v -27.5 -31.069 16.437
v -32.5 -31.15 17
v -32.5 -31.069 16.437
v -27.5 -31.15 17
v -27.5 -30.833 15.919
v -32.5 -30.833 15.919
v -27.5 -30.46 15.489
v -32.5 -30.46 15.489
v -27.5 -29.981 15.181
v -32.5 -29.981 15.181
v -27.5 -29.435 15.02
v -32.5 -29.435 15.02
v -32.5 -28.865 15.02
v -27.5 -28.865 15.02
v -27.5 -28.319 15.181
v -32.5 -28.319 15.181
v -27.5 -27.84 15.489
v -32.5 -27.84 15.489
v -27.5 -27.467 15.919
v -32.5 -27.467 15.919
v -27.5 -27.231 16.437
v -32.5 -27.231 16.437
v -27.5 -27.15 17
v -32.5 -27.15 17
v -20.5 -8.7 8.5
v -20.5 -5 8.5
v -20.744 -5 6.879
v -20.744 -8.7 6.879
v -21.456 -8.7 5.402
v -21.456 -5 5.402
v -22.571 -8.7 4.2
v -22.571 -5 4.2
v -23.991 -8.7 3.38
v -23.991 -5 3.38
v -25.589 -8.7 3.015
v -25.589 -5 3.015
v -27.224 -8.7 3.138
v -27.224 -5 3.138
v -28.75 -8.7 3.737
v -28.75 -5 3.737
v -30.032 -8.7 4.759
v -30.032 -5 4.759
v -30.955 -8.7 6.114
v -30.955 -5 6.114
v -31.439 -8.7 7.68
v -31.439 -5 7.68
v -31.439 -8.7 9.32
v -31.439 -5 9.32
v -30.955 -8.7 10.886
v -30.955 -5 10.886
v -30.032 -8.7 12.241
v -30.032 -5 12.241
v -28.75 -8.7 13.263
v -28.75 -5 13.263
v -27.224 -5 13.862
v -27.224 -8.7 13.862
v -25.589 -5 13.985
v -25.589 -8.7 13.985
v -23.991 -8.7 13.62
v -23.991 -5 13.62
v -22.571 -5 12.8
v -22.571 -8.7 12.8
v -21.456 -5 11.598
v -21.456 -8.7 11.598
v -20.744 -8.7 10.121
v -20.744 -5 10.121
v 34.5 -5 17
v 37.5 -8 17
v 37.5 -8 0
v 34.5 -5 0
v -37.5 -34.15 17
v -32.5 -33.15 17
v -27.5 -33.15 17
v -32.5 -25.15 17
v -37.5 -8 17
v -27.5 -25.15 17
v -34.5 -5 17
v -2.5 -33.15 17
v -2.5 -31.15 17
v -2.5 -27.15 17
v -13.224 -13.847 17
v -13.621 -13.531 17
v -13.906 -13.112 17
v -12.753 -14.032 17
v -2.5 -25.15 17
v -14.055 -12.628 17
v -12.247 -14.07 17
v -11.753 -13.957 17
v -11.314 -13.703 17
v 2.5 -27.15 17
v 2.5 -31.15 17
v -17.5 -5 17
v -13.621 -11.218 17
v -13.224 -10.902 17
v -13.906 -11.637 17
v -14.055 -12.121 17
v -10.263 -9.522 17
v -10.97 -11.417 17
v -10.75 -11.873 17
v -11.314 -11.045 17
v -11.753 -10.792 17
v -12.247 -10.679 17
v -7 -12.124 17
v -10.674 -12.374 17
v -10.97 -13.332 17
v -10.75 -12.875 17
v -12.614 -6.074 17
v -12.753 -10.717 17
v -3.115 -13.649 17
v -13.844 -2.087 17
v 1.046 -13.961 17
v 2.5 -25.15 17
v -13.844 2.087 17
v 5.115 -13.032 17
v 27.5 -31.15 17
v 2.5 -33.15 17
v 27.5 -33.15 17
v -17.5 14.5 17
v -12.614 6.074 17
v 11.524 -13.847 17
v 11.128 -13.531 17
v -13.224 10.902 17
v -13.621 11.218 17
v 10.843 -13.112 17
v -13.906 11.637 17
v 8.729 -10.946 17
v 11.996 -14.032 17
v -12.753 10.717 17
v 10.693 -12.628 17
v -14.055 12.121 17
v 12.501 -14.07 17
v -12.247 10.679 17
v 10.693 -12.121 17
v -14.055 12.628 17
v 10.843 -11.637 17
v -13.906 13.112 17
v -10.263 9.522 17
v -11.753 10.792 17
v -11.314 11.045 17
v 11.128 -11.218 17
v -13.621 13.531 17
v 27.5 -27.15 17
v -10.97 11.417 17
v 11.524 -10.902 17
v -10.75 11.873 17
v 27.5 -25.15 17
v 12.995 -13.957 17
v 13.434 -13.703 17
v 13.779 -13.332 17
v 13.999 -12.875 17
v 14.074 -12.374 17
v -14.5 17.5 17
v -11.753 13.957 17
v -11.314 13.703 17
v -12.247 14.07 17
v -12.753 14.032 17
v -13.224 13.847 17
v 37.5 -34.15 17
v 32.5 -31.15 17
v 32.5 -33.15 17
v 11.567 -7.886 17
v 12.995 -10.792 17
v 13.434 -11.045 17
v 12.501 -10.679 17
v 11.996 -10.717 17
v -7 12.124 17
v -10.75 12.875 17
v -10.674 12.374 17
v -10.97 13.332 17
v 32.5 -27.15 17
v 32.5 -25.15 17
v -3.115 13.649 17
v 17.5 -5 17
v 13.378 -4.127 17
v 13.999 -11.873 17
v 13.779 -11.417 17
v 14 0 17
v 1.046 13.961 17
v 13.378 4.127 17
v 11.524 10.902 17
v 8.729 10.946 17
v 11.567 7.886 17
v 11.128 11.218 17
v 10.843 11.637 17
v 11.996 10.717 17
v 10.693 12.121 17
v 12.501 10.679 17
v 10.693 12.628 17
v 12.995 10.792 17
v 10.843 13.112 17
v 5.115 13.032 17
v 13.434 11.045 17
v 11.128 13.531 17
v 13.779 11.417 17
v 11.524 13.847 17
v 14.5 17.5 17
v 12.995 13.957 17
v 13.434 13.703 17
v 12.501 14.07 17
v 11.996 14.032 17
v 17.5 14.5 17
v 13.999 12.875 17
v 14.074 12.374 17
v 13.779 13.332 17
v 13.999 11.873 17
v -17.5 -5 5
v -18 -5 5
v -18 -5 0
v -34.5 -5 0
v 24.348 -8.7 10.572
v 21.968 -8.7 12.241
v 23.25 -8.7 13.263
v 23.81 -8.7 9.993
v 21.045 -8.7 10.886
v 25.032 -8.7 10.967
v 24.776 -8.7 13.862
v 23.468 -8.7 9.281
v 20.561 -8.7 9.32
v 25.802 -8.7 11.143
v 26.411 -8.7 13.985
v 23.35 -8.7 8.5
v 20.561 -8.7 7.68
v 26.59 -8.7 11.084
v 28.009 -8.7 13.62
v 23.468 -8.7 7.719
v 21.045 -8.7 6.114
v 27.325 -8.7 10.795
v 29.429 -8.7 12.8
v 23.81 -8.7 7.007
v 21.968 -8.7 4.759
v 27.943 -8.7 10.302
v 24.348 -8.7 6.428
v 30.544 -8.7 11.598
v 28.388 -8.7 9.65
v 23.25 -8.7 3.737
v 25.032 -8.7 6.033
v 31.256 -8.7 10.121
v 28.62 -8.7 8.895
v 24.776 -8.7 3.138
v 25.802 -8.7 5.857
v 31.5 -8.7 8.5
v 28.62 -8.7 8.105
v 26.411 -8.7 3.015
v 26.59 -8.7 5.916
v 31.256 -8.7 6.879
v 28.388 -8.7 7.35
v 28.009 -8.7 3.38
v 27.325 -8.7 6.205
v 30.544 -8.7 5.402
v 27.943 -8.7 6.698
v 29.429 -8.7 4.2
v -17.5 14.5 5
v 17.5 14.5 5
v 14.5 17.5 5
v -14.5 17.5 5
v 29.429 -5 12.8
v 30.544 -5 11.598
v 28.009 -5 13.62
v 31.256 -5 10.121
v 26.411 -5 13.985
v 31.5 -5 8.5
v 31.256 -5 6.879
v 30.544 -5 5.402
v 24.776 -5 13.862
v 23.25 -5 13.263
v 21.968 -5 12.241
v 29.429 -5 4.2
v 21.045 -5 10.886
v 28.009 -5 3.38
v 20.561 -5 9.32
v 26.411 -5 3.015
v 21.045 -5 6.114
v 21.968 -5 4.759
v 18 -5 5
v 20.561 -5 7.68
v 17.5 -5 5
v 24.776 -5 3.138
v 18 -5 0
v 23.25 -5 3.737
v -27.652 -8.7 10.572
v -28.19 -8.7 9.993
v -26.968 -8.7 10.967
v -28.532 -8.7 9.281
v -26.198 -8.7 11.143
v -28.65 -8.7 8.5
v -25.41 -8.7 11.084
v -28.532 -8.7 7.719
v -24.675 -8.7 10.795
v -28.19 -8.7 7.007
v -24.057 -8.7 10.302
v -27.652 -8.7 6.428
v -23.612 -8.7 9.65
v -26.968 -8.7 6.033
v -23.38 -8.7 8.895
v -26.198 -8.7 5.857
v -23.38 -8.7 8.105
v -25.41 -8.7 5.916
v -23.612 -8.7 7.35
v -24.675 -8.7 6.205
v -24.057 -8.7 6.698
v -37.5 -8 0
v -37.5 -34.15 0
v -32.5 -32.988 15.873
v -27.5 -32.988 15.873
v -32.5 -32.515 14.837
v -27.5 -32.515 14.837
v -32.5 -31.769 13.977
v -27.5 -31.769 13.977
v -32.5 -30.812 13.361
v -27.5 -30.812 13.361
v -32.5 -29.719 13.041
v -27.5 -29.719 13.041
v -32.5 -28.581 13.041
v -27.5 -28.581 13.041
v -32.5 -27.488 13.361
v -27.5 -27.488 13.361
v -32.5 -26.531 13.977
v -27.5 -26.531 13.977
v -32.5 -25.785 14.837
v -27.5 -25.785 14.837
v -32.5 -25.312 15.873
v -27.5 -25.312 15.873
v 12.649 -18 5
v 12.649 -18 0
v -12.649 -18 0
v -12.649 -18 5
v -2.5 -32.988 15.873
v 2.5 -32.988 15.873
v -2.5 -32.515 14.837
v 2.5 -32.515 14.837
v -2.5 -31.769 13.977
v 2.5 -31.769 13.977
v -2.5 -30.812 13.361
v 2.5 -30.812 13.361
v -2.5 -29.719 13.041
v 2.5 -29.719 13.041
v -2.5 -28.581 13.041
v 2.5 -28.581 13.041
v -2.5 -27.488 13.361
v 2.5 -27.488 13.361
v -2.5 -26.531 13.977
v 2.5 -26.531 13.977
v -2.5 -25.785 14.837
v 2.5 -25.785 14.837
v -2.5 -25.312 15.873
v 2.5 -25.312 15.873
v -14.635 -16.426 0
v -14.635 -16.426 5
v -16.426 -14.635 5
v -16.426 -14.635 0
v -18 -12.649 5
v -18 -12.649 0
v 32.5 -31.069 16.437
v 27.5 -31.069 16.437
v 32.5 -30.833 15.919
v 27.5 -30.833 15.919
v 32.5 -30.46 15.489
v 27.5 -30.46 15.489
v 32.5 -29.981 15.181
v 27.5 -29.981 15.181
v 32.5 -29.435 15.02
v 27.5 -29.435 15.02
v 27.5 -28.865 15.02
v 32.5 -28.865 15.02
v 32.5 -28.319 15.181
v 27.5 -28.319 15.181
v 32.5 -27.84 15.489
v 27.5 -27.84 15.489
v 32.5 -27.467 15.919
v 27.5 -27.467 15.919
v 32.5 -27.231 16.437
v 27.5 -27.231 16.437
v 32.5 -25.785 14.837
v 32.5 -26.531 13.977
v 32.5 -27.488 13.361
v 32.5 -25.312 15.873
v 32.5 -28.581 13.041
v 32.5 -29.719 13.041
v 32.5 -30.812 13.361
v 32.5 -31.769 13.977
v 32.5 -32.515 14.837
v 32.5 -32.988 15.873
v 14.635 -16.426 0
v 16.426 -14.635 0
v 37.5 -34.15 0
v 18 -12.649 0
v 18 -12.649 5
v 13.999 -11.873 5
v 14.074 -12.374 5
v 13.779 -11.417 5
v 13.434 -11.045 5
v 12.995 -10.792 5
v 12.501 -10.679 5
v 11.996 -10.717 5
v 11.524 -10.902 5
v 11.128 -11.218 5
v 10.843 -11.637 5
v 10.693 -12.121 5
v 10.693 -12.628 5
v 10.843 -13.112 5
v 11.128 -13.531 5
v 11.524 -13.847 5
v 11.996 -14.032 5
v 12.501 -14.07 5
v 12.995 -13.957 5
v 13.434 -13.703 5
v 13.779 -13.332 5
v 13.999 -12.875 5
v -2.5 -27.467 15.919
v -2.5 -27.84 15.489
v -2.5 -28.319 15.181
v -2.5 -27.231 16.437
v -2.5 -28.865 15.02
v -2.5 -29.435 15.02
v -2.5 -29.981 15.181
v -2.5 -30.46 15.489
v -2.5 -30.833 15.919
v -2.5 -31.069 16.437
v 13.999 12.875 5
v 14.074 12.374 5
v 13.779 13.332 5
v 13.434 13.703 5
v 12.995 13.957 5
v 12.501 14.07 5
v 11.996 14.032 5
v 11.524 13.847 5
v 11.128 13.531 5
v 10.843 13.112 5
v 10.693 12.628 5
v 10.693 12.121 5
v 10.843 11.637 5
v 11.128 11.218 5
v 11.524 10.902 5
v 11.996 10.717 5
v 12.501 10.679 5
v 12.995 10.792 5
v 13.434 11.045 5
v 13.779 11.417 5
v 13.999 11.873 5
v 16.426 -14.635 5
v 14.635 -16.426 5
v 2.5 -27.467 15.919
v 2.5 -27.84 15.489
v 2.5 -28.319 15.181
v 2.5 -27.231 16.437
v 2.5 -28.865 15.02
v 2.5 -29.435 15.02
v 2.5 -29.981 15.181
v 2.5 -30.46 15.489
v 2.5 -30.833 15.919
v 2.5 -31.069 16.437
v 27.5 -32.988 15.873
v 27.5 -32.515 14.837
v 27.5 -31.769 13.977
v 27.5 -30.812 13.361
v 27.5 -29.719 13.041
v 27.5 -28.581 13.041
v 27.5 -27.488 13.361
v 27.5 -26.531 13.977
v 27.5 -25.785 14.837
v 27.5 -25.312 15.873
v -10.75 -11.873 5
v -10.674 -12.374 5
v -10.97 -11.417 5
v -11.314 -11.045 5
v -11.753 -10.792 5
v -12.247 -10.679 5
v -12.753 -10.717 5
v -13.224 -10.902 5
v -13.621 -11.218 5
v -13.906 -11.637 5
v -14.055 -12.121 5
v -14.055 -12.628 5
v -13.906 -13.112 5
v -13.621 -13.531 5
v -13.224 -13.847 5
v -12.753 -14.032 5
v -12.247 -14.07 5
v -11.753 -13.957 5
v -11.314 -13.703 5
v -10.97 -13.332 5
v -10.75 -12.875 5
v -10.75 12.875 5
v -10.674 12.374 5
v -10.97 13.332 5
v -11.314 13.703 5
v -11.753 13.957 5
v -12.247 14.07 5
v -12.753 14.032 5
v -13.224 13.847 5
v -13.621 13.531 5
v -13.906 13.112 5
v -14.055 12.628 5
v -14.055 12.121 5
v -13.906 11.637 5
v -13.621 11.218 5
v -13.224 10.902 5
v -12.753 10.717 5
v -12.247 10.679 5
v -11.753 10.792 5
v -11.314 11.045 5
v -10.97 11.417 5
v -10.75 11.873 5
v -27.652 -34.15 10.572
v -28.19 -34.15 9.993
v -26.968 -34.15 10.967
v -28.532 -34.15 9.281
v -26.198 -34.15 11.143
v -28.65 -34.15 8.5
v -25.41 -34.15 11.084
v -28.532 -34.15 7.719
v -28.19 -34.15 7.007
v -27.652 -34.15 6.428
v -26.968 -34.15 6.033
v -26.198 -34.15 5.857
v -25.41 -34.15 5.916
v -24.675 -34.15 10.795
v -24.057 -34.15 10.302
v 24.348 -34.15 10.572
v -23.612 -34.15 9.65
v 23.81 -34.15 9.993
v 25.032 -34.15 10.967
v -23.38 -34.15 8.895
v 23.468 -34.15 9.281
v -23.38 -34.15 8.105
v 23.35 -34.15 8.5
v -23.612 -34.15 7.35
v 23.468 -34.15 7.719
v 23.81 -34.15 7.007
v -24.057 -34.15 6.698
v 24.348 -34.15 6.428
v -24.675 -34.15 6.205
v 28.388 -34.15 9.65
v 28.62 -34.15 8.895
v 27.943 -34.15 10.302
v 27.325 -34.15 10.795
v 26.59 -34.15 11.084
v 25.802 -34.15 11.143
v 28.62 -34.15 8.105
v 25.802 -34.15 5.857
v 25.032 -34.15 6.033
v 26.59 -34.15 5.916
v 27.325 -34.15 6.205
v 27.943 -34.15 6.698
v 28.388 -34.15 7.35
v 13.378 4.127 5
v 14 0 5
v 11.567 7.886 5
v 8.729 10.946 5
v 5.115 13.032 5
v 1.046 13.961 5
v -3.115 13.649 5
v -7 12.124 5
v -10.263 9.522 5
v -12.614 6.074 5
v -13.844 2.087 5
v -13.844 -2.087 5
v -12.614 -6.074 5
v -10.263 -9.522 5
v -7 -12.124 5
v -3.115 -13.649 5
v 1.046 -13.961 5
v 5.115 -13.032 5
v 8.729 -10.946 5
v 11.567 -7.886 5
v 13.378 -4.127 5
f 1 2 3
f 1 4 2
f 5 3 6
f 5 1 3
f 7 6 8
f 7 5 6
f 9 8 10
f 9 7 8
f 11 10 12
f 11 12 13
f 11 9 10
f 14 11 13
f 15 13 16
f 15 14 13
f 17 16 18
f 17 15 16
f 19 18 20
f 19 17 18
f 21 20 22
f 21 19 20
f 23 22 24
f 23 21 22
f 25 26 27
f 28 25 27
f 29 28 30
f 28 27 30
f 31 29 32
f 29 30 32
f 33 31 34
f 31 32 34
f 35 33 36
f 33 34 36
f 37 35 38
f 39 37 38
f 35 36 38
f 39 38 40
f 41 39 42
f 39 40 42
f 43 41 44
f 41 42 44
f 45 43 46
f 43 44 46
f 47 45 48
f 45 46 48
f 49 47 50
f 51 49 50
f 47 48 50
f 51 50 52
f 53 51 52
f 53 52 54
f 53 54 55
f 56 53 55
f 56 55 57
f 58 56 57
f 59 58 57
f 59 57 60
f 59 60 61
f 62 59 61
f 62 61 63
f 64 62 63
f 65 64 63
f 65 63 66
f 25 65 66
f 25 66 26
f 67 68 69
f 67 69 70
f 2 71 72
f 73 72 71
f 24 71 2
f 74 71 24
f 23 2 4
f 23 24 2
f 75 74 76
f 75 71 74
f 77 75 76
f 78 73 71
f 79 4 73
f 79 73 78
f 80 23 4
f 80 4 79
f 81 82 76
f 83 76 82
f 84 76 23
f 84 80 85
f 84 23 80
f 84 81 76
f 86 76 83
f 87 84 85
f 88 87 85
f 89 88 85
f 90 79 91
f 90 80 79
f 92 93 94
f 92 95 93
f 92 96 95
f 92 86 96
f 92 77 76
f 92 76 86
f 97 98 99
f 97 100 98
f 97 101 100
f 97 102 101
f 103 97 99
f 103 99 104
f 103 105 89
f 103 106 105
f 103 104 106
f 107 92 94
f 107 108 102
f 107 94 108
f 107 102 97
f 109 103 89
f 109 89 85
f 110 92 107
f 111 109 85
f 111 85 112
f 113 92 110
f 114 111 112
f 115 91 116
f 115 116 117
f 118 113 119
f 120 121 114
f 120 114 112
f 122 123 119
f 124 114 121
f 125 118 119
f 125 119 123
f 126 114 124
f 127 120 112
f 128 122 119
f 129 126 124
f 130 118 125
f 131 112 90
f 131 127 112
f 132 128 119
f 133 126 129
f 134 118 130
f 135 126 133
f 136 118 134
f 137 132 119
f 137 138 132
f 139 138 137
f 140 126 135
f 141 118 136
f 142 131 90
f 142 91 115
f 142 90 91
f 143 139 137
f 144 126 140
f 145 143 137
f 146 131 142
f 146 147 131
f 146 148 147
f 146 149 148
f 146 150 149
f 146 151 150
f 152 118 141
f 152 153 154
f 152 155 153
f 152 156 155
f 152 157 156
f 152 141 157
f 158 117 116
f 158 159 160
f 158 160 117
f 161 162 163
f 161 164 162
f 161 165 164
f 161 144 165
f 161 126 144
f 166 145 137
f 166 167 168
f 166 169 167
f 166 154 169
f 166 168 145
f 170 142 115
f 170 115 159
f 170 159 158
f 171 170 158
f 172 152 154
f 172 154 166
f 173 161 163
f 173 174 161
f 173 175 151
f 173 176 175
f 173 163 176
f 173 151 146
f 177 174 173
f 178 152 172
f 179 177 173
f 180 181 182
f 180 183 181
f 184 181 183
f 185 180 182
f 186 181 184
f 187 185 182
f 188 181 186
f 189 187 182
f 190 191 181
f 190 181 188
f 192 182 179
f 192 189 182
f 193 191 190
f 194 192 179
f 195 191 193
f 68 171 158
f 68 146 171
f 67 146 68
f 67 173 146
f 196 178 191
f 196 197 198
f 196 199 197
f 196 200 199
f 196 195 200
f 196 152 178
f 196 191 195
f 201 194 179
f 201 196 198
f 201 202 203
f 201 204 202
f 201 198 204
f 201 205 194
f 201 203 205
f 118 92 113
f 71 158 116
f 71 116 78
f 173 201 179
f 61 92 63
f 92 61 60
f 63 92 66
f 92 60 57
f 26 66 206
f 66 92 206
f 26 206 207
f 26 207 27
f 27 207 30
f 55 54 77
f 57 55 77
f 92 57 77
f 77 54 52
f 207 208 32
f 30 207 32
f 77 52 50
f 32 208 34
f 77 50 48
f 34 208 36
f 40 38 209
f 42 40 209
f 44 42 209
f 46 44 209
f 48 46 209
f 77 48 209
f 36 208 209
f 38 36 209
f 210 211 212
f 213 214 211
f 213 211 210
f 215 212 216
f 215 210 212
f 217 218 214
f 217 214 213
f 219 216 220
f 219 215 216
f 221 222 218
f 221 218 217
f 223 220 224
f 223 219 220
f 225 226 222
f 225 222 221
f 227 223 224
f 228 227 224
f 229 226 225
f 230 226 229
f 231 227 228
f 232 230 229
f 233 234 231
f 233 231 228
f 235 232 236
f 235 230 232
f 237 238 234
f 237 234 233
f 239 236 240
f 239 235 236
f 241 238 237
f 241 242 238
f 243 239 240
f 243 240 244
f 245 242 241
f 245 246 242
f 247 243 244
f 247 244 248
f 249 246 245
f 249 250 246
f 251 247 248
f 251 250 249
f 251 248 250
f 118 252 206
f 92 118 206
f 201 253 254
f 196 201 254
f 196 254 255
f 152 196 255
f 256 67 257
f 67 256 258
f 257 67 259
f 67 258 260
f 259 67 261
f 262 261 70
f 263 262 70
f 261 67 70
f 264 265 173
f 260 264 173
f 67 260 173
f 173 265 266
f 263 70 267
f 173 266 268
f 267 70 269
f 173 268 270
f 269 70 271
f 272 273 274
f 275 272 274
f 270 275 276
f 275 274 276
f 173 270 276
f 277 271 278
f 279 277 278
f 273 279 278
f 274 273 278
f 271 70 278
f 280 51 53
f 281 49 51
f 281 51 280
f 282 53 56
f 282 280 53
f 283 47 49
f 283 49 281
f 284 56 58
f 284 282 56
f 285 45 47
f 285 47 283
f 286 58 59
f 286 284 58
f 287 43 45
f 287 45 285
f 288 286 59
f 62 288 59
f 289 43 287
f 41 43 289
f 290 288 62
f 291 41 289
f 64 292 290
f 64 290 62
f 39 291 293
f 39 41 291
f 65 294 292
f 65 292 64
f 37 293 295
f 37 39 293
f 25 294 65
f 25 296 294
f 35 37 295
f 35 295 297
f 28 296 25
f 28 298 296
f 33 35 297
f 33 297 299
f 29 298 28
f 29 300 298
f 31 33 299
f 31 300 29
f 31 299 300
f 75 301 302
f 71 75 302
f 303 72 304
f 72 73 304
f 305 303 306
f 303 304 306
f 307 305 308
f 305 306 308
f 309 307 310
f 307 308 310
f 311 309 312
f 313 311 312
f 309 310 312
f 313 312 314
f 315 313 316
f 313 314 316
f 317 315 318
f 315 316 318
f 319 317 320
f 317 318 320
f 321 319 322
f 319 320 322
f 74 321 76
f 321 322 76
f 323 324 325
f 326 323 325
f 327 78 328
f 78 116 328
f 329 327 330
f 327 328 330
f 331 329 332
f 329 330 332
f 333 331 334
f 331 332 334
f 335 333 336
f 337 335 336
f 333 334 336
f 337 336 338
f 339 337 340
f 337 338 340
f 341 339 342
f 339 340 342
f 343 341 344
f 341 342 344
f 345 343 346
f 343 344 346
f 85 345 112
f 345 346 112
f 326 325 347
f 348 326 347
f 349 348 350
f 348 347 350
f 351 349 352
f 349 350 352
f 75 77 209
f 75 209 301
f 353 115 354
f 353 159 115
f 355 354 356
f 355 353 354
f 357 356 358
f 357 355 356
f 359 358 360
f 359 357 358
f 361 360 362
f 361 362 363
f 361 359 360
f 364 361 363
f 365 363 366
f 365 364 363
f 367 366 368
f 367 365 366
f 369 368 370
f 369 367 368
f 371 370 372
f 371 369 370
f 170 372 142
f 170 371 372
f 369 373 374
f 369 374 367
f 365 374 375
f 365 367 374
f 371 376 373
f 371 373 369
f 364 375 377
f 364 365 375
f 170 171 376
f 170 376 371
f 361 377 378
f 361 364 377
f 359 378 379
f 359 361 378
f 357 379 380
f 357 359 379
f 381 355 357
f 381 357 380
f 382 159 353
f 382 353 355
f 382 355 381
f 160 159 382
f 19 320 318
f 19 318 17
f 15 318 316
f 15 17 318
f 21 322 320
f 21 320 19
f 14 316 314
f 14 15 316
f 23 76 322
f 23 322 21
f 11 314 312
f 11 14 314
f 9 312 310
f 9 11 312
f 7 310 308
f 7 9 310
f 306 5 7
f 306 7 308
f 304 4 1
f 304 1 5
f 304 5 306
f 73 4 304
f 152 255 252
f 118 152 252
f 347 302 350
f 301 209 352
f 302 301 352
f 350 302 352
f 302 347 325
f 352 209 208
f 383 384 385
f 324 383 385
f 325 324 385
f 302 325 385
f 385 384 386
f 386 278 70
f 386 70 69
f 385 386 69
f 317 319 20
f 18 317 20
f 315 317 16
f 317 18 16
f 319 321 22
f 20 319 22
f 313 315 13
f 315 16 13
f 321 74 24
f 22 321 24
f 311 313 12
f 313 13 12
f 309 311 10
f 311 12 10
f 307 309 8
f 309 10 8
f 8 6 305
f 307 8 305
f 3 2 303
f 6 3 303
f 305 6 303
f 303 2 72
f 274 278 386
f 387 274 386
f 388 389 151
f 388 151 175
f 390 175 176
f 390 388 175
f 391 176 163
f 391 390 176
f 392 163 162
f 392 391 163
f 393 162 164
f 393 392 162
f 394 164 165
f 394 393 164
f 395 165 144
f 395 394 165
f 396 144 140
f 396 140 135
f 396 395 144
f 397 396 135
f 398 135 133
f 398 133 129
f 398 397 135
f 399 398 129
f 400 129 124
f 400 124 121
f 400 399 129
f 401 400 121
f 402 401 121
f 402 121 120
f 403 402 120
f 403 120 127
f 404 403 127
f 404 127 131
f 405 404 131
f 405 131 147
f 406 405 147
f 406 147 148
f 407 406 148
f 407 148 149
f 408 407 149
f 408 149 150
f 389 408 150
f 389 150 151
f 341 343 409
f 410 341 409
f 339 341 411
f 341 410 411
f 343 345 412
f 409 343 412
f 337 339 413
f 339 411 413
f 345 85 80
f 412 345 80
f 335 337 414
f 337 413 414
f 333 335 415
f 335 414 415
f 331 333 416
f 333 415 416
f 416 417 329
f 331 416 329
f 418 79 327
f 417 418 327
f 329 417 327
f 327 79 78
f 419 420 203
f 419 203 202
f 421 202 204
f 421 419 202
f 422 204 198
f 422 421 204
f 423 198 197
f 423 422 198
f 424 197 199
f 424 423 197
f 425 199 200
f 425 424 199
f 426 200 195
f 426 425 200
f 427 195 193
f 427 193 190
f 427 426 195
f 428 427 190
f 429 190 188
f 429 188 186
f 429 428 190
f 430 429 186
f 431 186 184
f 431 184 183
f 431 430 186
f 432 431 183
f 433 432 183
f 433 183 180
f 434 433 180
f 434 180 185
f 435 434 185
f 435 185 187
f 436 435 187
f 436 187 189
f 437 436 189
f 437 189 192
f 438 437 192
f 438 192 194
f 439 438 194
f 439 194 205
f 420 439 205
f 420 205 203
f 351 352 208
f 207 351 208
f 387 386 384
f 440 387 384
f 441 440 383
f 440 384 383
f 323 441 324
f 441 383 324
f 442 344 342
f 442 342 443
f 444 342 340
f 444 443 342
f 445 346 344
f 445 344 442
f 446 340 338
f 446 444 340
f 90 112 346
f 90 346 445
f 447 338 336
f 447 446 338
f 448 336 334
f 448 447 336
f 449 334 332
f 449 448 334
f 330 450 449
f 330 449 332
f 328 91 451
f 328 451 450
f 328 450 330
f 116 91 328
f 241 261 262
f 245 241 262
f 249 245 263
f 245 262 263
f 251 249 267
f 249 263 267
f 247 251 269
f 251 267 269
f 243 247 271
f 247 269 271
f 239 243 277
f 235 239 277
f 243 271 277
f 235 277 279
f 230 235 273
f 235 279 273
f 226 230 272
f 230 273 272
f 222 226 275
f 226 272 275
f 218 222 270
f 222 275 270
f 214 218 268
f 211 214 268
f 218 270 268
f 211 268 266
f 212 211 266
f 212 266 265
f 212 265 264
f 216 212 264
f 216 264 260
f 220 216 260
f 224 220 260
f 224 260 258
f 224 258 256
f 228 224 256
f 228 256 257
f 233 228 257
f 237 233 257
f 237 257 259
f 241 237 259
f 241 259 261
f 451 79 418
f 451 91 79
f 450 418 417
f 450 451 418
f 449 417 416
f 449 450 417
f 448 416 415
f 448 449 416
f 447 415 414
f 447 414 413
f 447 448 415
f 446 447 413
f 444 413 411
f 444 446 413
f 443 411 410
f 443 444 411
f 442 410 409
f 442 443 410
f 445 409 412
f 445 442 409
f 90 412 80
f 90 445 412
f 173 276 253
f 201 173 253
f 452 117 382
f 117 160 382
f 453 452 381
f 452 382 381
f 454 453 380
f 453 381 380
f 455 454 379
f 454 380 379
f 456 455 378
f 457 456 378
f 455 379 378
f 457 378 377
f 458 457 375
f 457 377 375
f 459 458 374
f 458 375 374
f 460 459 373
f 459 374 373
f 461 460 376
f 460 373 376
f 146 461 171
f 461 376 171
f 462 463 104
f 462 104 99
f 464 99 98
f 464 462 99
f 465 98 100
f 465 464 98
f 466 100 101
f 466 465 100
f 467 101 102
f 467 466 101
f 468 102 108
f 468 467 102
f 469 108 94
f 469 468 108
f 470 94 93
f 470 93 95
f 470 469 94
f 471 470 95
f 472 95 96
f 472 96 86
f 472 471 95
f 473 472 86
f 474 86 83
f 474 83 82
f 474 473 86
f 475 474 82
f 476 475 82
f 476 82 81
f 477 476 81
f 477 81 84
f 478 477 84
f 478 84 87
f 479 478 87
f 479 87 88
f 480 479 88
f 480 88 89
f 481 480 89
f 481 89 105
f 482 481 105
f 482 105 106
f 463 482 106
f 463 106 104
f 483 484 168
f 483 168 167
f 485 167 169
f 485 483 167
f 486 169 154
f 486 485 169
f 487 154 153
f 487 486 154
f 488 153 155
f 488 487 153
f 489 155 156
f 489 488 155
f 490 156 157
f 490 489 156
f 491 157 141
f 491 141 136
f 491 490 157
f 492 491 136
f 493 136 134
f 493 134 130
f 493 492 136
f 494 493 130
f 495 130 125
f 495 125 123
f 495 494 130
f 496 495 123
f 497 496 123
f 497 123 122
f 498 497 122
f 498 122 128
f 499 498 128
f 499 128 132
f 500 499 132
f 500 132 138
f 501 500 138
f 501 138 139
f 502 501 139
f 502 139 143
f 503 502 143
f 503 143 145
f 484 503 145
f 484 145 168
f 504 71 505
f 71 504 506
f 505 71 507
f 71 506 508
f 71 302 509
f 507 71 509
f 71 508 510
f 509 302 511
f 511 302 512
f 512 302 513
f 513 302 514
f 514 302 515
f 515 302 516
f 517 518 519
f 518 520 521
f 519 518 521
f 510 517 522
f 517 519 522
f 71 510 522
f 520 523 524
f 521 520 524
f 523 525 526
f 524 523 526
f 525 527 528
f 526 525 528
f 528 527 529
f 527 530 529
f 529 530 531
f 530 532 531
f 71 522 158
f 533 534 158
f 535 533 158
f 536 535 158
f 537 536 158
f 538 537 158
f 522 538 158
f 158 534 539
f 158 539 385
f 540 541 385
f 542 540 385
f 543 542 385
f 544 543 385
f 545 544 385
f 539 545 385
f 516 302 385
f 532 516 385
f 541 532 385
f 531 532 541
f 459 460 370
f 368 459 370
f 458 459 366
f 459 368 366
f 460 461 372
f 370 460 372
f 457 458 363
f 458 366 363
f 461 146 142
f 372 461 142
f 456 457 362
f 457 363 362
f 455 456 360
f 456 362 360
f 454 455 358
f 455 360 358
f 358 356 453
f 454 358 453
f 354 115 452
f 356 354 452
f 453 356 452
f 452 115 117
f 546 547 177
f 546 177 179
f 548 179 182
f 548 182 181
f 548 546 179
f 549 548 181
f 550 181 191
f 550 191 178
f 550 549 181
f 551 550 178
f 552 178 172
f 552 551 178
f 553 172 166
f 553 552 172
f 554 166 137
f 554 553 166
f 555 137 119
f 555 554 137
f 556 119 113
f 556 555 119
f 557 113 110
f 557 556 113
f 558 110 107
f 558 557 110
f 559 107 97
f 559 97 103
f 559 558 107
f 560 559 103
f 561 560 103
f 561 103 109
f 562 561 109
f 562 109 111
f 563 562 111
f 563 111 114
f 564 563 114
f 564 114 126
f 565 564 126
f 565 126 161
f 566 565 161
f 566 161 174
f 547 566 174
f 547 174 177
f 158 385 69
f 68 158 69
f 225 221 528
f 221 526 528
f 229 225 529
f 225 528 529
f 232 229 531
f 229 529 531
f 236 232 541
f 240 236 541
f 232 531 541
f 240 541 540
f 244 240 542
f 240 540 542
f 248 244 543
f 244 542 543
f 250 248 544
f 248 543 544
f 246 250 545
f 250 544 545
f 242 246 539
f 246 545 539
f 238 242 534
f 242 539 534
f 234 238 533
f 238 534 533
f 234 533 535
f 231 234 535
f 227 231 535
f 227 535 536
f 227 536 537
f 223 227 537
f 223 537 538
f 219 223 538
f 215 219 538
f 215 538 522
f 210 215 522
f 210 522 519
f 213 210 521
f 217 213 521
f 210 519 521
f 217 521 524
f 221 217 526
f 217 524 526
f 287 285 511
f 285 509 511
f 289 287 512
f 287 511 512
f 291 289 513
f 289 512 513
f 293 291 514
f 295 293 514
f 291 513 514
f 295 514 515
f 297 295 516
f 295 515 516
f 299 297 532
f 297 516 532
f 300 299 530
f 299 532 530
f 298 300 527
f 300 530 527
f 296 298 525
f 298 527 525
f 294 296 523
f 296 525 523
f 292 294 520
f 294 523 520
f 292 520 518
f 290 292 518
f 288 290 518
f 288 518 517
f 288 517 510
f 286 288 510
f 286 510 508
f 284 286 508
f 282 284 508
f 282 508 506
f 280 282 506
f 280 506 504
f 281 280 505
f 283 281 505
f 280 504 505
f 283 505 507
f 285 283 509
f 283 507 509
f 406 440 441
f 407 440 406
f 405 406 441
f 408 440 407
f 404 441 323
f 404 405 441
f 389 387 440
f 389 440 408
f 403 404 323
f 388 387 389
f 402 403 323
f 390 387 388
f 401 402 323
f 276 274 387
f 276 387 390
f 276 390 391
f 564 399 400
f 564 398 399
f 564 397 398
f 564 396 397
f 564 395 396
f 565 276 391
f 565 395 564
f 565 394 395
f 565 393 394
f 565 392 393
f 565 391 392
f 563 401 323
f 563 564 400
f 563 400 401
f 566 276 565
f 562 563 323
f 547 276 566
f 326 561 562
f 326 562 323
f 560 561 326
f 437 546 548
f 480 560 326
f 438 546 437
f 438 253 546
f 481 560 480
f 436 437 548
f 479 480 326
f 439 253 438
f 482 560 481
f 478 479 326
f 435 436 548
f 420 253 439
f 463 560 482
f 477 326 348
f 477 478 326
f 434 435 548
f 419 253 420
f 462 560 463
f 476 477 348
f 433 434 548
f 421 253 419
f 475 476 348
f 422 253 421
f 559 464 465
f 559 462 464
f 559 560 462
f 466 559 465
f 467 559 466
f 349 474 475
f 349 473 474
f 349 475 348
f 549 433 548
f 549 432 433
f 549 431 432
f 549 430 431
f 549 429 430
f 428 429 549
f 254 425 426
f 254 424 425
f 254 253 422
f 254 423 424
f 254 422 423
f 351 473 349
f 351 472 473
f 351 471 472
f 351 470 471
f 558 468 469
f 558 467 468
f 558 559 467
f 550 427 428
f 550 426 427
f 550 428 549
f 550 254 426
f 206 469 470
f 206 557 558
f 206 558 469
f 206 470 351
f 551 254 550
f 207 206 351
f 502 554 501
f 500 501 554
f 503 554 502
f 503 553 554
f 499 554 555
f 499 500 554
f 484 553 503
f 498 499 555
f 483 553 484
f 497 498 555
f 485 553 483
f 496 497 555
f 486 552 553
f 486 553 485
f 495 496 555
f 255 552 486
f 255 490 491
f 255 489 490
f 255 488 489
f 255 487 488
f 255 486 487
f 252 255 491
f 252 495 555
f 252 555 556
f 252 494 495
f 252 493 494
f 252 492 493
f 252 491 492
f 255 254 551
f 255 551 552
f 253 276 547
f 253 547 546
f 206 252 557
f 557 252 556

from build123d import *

# Parameters (mm, degrees)
ESQUISSE1_R                                        = 14
ESQUISSE1_R_2                                      = 1.7
BOSS_EXTRU_1_DEPTH                                 = 17
BOSS_EXTRU_2_START                                 = -17
ESQUISSE2_R                                        = 1.7
ESQUISSE2_R_2                                      = 14
BOSS_EXTRU_2_DEPTH                                 = 17
CHAMBRAGE_POUR_VIS_T_TE_RONDE_BOMB_E_M_D           = 5.3
CHAMBRAGE_POUR_VIS_T_TE_RONDE_BOMB_E_M_DEPTH       = 35
CHAMBRAGE_POUR_VIS_T_TE_RONDE_BOMB_E_M_CBORE_D     = 11
CHAMBRAGE_POUR_VIS_T_TE_RONDE_BOMB_E_M_CBORE_DEPTH = 3.7
CHAMBRAGE_POUR_VIS_T_TE_RONDE_BOMB_E_M_TIP         = 1.59228064
ESQUISSE7_W                                        = 5
ESQUISSE7_H                                        = 2
ENL_V_MAT_EXTRU_1_DEPTH                            = 5
ENL_V_MAT_EXTRU_2_DEPTH                            = 5


with BuildPart() as part:
    # Esquisse1 → Boss.-Extru.1 (new body)
    with BuildSketch(Plane.XY):
        with BuildLine():
            Line((12.489995997, 17.5), (-12.489995997, 17.5))
            ThreePointArc((-12.489995997, 17.5), (-15.202795796, 15.202795796), (-17.5, 12.489995997))
            Line((-17.5, 12.489995997), (-17.5, -12.489995997))
            ThreePointArc((-17.5, -12.489995997), (-15.202795796, -15.202795796), (-12.489995997, -17.5))
            Line((-12.489995997, -17.5), (12.489995997, -17.5))
            ThreePointArc((12.489995997, -17.5), (15.202795796, -15.202795796), (17.5, -12.489995997))
            Line((17.5, -12.489995997), (17.5, 12.489995997))
            ThreePointArc((17.5, 12.489995997), (15.202795796, 15.202795796), (12.489995997, 17.5))
        make_face()
        Circle(ESQUISSE1_R, mode=Mode.SUBTRACT)
        with Locations((-12.374368671, -12.374368671)):
            Circle(ESQUISSE1_R_2, mode=Mode.SUBTRACT)
        with Locations((12.374368671, -12.374368671)):
            Circle(ESQUISSE1_R_2, mode=Mode.SUBTRACT)
        with Locations((12.374368671, 12.374368671)):
            Circle(ESQUISSE1_R_2, mode=Mode.SUBTRACT)
        with Locations((-12.374368671, 12.374368671)):
            Circle(ESQUISSE1_R_2, mode=Mode.SUBTRACT)
    extrude(amount=BOSS_EXTRU_1_DEPTH)

    # Esquisse2 → Boss.-Extru.2 (add)
    with BuildSketch(Plane.XY.offset(17).offset(BOSS_EXTRU_2_START)):
        Polygon((-12.489995997, 17.5), (-14.5, 17.5), (-17.5, 14.5), (-17.5, -5), (-34.5, -5), (-37.5, -8), (-37.5, -34.15), (37.5, -34.15), (37.5, -8), (34.5, -5), (17.5, -5), (17.5, 14.5), (14.5, 17.5), align=None)
        with Locations((12.374368671, 12.374368671)):
            Circle(ESQUISSE2_R, mode=Mode.SUBTRACT)
        with Locations((12.374368671, -12.374368671)):
            Circle(ESQUISSE2_R, mode=Mode.SUBTRACT)
        with Locations((-12.374368671, -12.374368671)):
            Circle(ESQUISSE2_R, mode=Mode.SUBTRACT)
        with Locations((-12.374368671, 12.374368671)):
            Circle(ESQUISSE2_R, mode=Mode.SUBTRACT)
        Circle(ESQUISSE2_R_2, mode=Mode.SUBTRACT)
    extrude(amount=BOSS_EXTRU_2_DEPTH)

    # Chambrage pour vis à tête ronde bombée M51
    with Locations(Plane(origin=(0, -5, 0), x_dir=(1, 0, 0), z_dir=(0, 1, 0))):
        with Locations((-26, -8.5), (26, -8.5)):
            CounterBoreHole(CHAMBRAGE_POUR_VIS_T_TE_RONDE_BOMB_E_M_D / 2, CHAMBRAGE_POUR_VIS_T_TE_RONDE_BOMB_E_M_CBORE_D / 2, CHAMBRAGE_POUR_VIS_T_TE_RONDE_BOMB_E_M_CBORE_DEPTH, depth=CHAMBRAGE_POUR_VIS_T_TE_RONDE_BOMB_E_M_DEPTH)
            with Locations((0, 0, -(CHAMBRAGE_POUR_VIS_T_TE_RONDE_BOMB_E_M_DEPTH + CHAMBRAGE_POUR_VIS_T_TE_RONDE_BOMB_E_M_TIP / 2))):  # 118° drill point
                Cone(0, CHAMBRAGE_POUR_VIS_T_TE_RONDE_BOMB_E_M_D / 2, CHAMBRAGE_POUR_VIS_T_TE_RONDE_BOMB_E_M_TIP, mode=Mode.SUBTRACT)

    # Esquisse7 → Enlèvement de matière-Révolution1 (revolve, cut)
    with BuildSketch(Plane.XY.offset(17)):
        with Locations((0, -26.15)):
            Rectangle(ESQUISSE7_W, ESQUISSE7_H)
        with Locations((-30, -26.15)):
            Rectangle(ESQUISSE7_W, ESQUISSE7_H)
        with Locations((30, -26.15)):
            Rectangle(ESQUISSE7_W, ESQUISSE7_H)
    revolve(axis=Axis((-37.5, -29.15, 17), (1, 0, 0)), mode=Mode.SUBTRACT)

    # Esquisse8 → Enlèv. mat.-Extru.1 (cut)
    with BuildSketch(Plane(origin=(0, 0, 0), x_dir=(-1, 0, 0), z_dir=(0, 0, -1))):
        with BuildLine():
            Line((-12.489995997, 17.5), (-14.5, 17.5))
            Line((-14.5, 17.5), (-17.5, 14.5))
            Line((-17.5, 14.5), (-17.5, 12.489995997))
            Line((-17.5, 12.489995997), (-17.5, -12.489995997))
            ThreePointArc((-17.5, -12.489995997), (-15.202795796, -15.202795796), (-12.489995997, -17.5))
            Line((-12.489995997, -17.5), (12.489995997, -17.5))
            ThreePointArc((12.489995997, -17.5), (15.202795796, -15.202795796), (17.5, -12.489995997))
            Line((17.5, -12.489995997), (17.5, 12.489995997))
            Line((17.5, 12.489995997), (17.5, 14.5))
            Line((17.5, 14.5), (14.5, 17.5))
            Line((14.5, 17.5), (12.489995997, 17.5))
            Line((12.489995997, 17.5), (-12.489995997, 17.5))
        make_face()
    extrude(amount=-ENL_V_MAT_EXTRU_1_DEPTH, mode=Mode.SUBTRACT)

    # Esquisse9 → Enlèv. mat.-Extru.2 (cut)
    with BuildSketch(Plane(origin=(0, 0, 0), x_dir=(-1, 0, 0), z_dir=(0, 0, -1))):
        with BuildLine():
            Line((-18, -4.5), (-18, -12.649110641))
            ThreePointArc((-18, -12.649110641), (-15.556349186, -15.556349186), (-12.649110641, -18))
            Line((-12.649110641, -18), (12.649110641, -18))
            ThreePointArc((12.649110641, -18), (15.556349186, -15.556349186), (18, -12.649110641))
            Line((18, -12.649110641), (18, -4.5))
            Line((18, -4.5), (-18, -4.5))
        make_face()
        with BuildLine():
            Line((17.5, -12.489995997), (17.5, -5))
            Line((17.5, -5), (-17.5, -5))
            Line((-17.5, -5), (-17.5, -12.489995997))
            ThreePointArc((-17.5, -12.489995997), (-15.202795796, -15.202795796), (-12.489995997, -17.5))
            Line((-12.489995997, -17.5), (12.489995997, -17.5))
            ThreePointArc((12.489995997, -17.5), (15.202795796, -15.202795796), (17.5, -12.489995997))
        make_face(mode=Mode.SUBTRACT)
    extrude(amount=-ENL_V_MAT_EXTRU_2_DEPTH, mode=Mode.SUBTRACT)


solid = part.part
